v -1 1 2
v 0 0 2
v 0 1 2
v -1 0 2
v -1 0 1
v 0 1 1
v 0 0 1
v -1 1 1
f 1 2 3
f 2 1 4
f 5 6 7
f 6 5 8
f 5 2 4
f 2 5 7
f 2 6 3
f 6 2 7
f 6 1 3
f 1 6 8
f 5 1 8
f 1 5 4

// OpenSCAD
translate(v = [0, 0, -2]) {
	translate(v = [2, 0, 0]) {
		translate(v = [0, 0, 3]) {
			translate(v = [-3, 0, 0]) {
				cube();
			}
		}
	}
}
